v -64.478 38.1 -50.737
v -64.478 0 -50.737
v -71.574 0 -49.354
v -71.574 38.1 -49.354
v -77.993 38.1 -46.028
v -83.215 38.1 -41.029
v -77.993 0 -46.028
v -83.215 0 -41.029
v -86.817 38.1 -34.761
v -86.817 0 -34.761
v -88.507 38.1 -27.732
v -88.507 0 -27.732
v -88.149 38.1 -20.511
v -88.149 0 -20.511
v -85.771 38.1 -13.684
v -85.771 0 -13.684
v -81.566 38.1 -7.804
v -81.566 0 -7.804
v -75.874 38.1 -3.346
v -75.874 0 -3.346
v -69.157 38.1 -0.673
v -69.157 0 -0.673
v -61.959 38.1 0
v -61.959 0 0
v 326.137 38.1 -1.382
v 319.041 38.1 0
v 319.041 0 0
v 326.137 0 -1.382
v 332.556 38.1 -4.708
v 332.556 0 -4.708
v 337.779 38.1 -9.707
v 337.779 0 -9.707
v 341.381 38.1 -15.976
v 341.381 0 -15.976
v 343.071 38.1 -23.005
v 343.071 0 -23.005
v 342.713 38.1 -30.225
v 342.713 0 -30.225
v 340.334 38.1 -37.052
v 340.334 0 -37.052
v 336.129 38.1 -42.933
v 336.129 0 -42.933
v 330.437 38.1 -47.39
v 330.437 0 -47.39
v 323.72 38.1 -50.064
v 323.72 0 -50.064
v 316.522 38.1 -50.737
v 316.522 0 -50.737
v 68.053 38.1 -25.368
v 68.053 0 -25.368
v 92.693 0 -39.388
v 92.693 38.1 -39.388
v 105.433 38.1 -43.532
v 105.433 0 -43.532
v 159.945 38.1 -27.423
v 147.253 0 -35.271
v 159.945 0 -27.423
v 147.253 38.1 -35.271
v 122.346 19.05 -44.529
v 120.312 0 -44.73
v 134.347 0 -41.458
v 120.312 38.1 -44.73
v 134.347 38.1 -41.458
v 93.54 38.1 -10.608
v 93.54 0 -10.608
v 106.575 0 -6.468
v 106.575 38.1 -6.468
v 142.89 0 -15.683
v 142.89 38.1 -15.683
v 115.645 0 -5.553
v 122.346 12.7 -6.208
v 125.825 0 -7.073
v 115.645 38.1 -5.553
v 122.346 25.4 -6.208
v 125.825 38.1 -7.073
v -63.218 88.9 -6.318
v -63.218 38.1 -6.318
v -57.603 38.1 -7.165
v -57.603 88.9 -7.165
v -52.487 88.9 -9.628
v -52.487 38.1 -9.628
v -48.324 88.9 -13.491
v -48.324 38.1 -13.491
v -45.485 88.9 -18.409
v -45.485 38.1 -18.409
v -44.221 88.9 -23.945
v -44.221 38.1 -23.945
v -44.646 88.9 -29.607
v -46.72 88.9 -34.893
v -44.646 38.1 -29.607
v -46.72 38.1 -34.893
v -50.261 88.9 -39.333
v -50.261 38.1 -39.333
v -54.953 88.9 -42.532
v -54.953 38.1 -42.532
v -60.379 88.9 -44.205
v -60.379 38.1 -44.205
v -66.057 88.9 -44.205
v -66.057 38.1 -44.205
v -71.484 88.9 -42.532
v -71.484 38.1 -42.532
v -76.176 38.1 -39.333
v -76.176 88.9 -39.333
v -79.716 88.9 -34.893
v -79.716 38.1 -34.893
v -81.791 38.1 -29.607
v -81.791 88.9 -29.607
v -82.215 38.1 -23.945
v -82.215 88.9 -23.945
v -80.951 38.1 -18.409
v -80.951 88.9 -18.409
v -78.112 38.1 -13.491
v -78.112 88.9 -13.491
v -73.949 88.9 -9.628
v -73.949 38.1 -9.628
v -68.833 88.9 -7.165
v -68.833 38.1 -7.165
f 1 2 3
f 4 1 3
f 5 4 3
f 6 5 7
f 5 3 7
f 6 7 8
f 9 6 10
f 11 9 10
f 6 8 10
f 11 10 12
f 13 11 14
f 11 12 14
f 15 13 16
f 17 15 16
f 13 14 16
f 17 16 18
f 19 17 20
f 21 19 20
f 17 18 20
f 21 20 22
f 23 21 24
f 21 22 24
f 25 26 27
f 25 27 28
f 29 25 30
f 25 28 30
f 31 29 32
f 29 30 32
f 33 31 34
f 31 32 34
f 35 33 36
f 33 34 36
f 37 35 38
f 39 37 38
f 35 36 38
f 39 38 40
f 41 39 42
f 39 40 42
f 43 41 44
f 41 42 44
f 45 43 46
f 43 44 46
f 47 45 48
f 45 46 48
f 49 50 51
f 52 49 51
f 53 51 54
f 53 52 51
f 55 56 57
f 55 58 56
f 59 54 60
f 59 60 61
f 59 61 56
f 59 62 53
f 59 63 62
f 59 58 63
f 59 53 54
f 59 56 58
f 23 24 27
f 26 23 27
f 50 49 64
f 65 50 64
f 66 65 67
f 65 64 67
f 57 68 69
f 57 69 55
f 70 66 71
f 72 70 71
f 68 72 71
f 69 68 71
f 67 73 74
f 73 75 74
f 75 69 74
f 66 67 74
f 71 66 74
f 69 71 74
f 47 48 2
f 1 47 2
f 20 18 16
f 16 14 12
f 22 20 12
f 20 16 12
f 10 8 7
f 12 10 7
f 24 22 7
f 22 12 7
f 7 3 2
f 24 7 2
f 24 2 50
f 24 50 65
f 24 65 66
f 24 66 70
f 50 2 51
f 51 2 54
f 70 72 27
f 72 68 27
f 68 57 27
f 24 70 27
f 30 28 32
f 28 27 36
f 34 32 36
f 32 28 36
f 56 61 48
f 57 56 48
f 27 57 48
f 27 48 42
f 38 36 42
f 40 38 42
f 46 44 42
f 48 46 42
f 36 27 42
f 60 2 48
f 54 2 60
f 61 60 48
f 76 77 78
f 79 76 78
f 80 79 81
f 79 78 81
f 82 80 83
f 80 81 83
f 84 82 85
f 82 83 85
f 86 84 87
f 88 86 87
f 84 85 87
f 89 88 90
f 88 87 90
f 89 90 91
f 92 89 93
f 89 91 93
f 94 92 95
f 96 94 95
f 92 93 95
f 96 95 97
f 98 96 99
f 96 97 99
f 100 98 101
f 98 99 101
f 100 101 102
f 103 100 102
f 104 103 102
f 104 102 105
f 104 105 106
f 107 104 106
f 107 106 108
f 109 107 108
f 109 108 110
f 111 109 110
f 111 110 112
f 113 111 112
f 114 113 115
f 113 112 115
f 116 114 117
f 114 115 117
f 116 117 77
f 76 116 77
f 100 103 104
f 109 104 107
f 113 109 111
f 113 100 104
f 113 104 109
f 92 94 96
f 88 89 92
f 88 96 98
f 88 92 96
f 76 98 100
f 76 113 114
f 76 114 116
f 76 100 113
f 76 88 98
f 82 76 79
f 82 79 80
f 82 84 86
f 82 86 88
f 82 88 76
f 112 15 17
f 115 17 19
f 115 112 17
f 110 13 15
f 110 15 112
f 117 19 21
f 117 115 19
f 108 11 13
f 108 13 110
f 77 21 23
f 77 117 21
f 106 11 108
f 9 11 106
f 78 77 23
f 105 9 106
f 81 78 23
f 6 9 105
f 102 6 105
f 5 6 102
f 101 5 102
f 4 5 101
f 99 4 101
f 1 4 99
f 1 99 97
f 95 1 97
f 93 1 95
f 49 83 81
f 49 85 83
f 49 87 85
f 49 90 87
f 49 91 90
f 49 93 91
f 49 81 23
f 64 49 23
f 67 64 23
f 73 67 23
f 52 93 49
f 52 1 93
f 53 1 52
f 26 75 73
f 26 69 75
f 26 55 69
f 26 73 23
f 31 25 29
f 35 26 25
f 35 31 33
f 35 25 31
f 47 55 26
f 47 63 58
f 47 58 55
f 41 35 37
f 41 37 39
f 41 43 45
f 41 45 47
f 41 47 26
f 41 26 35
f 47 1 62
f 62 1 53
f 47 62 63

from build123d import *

# Parameters (mm, degrees)
SALIENTE_EXTRUIR1_DEPTH = 38.1
CORTAR_EXTRUIR18_DEPTH  = 38.1
CROQUIS5_R              = 19.05
SALIENTE_EXTRUIR2_DEPTH = 50.8


with BuildPart() as part:
    # Croquis1 → Saliente-Extruir1 (new body)
    with BuildSketch(Plane(origin=(0, 0, 0), x_dir=(1, 0, 0), z_dir=(0, 1, 0))):
        with BuildLine():
            Line((-61.958802083, 0), (319.041197917, 0))
            ThreePointArc((319.041197917, 0), (343.15003125, 26.627666667), (316.522364583, 50.7365))
            Line((316.522364583, 50.7365), (-64.477635417, 50.7365))
            ThreePointArc((-64.477635417, 50.7365), (-88.58646875, 24.108833333), (-61.958802083, 0))
        make_face()
    extrude(amount=SALIENTE_EXTRUIR1_DEPTH)

    # Croquis3 → Cortar-Extruir18 (cut)
    with BuildSketch(Plane(origin=(0, 38.1, 0), x_dir=(1, 0, 0), z_dir=(0, 1, 0))):
        with BuildLine():
            add(Edge.make_bspline(
                [(68.053382641, 25.36825), (85.128897701, 37.242607365), (117.715779547, 53.529246636), (147.710358419, 35.418129568), (159.94527156, 27.422727745)],
                knots=[0.293668056, 0.293668056, 0.293668056, 0.293668056, 0.509999468, 0.663692502, 0.663692502, 0.663692502, 0.663692502], degree=3))
            add(Edge.make_bspline(
                [(68.053382641, 25.36825), (85.297187869, 13.221681932), (118.362782549, -4.355831371), (146.208725565, 18.171330049), (158.923925731, 26.746070777), (159.94527156, 27.422727745)],
                knots=[0.293535528, 0.293535528, 0.293535528, 0.293535528, 0.509769313, 0.658147643, 0.671041491, 0.671041491, 0.671041491, 0.671041491], degree=3))
        make_face()
    extrude(amount=-CORTAR_EXTRUIR18_DEPTH, mode=Mode.SUBTRACT)

    # Croquis5 → Saliente-Extruir2 (add)
    with BuildSketch(Plane(origin=(0, 38.1, 0), x_dir=(1, 0, 0), z_dir=(0, 1, 0))):
        with Locations(Location((-63.21821875, 25.36825, 0), (0, 0, 270))):
            Circle(CROQUIS5_R)
    extrude(amount=SALIENTE_EXTRUIR2_DEPTH)


solid = part.part
